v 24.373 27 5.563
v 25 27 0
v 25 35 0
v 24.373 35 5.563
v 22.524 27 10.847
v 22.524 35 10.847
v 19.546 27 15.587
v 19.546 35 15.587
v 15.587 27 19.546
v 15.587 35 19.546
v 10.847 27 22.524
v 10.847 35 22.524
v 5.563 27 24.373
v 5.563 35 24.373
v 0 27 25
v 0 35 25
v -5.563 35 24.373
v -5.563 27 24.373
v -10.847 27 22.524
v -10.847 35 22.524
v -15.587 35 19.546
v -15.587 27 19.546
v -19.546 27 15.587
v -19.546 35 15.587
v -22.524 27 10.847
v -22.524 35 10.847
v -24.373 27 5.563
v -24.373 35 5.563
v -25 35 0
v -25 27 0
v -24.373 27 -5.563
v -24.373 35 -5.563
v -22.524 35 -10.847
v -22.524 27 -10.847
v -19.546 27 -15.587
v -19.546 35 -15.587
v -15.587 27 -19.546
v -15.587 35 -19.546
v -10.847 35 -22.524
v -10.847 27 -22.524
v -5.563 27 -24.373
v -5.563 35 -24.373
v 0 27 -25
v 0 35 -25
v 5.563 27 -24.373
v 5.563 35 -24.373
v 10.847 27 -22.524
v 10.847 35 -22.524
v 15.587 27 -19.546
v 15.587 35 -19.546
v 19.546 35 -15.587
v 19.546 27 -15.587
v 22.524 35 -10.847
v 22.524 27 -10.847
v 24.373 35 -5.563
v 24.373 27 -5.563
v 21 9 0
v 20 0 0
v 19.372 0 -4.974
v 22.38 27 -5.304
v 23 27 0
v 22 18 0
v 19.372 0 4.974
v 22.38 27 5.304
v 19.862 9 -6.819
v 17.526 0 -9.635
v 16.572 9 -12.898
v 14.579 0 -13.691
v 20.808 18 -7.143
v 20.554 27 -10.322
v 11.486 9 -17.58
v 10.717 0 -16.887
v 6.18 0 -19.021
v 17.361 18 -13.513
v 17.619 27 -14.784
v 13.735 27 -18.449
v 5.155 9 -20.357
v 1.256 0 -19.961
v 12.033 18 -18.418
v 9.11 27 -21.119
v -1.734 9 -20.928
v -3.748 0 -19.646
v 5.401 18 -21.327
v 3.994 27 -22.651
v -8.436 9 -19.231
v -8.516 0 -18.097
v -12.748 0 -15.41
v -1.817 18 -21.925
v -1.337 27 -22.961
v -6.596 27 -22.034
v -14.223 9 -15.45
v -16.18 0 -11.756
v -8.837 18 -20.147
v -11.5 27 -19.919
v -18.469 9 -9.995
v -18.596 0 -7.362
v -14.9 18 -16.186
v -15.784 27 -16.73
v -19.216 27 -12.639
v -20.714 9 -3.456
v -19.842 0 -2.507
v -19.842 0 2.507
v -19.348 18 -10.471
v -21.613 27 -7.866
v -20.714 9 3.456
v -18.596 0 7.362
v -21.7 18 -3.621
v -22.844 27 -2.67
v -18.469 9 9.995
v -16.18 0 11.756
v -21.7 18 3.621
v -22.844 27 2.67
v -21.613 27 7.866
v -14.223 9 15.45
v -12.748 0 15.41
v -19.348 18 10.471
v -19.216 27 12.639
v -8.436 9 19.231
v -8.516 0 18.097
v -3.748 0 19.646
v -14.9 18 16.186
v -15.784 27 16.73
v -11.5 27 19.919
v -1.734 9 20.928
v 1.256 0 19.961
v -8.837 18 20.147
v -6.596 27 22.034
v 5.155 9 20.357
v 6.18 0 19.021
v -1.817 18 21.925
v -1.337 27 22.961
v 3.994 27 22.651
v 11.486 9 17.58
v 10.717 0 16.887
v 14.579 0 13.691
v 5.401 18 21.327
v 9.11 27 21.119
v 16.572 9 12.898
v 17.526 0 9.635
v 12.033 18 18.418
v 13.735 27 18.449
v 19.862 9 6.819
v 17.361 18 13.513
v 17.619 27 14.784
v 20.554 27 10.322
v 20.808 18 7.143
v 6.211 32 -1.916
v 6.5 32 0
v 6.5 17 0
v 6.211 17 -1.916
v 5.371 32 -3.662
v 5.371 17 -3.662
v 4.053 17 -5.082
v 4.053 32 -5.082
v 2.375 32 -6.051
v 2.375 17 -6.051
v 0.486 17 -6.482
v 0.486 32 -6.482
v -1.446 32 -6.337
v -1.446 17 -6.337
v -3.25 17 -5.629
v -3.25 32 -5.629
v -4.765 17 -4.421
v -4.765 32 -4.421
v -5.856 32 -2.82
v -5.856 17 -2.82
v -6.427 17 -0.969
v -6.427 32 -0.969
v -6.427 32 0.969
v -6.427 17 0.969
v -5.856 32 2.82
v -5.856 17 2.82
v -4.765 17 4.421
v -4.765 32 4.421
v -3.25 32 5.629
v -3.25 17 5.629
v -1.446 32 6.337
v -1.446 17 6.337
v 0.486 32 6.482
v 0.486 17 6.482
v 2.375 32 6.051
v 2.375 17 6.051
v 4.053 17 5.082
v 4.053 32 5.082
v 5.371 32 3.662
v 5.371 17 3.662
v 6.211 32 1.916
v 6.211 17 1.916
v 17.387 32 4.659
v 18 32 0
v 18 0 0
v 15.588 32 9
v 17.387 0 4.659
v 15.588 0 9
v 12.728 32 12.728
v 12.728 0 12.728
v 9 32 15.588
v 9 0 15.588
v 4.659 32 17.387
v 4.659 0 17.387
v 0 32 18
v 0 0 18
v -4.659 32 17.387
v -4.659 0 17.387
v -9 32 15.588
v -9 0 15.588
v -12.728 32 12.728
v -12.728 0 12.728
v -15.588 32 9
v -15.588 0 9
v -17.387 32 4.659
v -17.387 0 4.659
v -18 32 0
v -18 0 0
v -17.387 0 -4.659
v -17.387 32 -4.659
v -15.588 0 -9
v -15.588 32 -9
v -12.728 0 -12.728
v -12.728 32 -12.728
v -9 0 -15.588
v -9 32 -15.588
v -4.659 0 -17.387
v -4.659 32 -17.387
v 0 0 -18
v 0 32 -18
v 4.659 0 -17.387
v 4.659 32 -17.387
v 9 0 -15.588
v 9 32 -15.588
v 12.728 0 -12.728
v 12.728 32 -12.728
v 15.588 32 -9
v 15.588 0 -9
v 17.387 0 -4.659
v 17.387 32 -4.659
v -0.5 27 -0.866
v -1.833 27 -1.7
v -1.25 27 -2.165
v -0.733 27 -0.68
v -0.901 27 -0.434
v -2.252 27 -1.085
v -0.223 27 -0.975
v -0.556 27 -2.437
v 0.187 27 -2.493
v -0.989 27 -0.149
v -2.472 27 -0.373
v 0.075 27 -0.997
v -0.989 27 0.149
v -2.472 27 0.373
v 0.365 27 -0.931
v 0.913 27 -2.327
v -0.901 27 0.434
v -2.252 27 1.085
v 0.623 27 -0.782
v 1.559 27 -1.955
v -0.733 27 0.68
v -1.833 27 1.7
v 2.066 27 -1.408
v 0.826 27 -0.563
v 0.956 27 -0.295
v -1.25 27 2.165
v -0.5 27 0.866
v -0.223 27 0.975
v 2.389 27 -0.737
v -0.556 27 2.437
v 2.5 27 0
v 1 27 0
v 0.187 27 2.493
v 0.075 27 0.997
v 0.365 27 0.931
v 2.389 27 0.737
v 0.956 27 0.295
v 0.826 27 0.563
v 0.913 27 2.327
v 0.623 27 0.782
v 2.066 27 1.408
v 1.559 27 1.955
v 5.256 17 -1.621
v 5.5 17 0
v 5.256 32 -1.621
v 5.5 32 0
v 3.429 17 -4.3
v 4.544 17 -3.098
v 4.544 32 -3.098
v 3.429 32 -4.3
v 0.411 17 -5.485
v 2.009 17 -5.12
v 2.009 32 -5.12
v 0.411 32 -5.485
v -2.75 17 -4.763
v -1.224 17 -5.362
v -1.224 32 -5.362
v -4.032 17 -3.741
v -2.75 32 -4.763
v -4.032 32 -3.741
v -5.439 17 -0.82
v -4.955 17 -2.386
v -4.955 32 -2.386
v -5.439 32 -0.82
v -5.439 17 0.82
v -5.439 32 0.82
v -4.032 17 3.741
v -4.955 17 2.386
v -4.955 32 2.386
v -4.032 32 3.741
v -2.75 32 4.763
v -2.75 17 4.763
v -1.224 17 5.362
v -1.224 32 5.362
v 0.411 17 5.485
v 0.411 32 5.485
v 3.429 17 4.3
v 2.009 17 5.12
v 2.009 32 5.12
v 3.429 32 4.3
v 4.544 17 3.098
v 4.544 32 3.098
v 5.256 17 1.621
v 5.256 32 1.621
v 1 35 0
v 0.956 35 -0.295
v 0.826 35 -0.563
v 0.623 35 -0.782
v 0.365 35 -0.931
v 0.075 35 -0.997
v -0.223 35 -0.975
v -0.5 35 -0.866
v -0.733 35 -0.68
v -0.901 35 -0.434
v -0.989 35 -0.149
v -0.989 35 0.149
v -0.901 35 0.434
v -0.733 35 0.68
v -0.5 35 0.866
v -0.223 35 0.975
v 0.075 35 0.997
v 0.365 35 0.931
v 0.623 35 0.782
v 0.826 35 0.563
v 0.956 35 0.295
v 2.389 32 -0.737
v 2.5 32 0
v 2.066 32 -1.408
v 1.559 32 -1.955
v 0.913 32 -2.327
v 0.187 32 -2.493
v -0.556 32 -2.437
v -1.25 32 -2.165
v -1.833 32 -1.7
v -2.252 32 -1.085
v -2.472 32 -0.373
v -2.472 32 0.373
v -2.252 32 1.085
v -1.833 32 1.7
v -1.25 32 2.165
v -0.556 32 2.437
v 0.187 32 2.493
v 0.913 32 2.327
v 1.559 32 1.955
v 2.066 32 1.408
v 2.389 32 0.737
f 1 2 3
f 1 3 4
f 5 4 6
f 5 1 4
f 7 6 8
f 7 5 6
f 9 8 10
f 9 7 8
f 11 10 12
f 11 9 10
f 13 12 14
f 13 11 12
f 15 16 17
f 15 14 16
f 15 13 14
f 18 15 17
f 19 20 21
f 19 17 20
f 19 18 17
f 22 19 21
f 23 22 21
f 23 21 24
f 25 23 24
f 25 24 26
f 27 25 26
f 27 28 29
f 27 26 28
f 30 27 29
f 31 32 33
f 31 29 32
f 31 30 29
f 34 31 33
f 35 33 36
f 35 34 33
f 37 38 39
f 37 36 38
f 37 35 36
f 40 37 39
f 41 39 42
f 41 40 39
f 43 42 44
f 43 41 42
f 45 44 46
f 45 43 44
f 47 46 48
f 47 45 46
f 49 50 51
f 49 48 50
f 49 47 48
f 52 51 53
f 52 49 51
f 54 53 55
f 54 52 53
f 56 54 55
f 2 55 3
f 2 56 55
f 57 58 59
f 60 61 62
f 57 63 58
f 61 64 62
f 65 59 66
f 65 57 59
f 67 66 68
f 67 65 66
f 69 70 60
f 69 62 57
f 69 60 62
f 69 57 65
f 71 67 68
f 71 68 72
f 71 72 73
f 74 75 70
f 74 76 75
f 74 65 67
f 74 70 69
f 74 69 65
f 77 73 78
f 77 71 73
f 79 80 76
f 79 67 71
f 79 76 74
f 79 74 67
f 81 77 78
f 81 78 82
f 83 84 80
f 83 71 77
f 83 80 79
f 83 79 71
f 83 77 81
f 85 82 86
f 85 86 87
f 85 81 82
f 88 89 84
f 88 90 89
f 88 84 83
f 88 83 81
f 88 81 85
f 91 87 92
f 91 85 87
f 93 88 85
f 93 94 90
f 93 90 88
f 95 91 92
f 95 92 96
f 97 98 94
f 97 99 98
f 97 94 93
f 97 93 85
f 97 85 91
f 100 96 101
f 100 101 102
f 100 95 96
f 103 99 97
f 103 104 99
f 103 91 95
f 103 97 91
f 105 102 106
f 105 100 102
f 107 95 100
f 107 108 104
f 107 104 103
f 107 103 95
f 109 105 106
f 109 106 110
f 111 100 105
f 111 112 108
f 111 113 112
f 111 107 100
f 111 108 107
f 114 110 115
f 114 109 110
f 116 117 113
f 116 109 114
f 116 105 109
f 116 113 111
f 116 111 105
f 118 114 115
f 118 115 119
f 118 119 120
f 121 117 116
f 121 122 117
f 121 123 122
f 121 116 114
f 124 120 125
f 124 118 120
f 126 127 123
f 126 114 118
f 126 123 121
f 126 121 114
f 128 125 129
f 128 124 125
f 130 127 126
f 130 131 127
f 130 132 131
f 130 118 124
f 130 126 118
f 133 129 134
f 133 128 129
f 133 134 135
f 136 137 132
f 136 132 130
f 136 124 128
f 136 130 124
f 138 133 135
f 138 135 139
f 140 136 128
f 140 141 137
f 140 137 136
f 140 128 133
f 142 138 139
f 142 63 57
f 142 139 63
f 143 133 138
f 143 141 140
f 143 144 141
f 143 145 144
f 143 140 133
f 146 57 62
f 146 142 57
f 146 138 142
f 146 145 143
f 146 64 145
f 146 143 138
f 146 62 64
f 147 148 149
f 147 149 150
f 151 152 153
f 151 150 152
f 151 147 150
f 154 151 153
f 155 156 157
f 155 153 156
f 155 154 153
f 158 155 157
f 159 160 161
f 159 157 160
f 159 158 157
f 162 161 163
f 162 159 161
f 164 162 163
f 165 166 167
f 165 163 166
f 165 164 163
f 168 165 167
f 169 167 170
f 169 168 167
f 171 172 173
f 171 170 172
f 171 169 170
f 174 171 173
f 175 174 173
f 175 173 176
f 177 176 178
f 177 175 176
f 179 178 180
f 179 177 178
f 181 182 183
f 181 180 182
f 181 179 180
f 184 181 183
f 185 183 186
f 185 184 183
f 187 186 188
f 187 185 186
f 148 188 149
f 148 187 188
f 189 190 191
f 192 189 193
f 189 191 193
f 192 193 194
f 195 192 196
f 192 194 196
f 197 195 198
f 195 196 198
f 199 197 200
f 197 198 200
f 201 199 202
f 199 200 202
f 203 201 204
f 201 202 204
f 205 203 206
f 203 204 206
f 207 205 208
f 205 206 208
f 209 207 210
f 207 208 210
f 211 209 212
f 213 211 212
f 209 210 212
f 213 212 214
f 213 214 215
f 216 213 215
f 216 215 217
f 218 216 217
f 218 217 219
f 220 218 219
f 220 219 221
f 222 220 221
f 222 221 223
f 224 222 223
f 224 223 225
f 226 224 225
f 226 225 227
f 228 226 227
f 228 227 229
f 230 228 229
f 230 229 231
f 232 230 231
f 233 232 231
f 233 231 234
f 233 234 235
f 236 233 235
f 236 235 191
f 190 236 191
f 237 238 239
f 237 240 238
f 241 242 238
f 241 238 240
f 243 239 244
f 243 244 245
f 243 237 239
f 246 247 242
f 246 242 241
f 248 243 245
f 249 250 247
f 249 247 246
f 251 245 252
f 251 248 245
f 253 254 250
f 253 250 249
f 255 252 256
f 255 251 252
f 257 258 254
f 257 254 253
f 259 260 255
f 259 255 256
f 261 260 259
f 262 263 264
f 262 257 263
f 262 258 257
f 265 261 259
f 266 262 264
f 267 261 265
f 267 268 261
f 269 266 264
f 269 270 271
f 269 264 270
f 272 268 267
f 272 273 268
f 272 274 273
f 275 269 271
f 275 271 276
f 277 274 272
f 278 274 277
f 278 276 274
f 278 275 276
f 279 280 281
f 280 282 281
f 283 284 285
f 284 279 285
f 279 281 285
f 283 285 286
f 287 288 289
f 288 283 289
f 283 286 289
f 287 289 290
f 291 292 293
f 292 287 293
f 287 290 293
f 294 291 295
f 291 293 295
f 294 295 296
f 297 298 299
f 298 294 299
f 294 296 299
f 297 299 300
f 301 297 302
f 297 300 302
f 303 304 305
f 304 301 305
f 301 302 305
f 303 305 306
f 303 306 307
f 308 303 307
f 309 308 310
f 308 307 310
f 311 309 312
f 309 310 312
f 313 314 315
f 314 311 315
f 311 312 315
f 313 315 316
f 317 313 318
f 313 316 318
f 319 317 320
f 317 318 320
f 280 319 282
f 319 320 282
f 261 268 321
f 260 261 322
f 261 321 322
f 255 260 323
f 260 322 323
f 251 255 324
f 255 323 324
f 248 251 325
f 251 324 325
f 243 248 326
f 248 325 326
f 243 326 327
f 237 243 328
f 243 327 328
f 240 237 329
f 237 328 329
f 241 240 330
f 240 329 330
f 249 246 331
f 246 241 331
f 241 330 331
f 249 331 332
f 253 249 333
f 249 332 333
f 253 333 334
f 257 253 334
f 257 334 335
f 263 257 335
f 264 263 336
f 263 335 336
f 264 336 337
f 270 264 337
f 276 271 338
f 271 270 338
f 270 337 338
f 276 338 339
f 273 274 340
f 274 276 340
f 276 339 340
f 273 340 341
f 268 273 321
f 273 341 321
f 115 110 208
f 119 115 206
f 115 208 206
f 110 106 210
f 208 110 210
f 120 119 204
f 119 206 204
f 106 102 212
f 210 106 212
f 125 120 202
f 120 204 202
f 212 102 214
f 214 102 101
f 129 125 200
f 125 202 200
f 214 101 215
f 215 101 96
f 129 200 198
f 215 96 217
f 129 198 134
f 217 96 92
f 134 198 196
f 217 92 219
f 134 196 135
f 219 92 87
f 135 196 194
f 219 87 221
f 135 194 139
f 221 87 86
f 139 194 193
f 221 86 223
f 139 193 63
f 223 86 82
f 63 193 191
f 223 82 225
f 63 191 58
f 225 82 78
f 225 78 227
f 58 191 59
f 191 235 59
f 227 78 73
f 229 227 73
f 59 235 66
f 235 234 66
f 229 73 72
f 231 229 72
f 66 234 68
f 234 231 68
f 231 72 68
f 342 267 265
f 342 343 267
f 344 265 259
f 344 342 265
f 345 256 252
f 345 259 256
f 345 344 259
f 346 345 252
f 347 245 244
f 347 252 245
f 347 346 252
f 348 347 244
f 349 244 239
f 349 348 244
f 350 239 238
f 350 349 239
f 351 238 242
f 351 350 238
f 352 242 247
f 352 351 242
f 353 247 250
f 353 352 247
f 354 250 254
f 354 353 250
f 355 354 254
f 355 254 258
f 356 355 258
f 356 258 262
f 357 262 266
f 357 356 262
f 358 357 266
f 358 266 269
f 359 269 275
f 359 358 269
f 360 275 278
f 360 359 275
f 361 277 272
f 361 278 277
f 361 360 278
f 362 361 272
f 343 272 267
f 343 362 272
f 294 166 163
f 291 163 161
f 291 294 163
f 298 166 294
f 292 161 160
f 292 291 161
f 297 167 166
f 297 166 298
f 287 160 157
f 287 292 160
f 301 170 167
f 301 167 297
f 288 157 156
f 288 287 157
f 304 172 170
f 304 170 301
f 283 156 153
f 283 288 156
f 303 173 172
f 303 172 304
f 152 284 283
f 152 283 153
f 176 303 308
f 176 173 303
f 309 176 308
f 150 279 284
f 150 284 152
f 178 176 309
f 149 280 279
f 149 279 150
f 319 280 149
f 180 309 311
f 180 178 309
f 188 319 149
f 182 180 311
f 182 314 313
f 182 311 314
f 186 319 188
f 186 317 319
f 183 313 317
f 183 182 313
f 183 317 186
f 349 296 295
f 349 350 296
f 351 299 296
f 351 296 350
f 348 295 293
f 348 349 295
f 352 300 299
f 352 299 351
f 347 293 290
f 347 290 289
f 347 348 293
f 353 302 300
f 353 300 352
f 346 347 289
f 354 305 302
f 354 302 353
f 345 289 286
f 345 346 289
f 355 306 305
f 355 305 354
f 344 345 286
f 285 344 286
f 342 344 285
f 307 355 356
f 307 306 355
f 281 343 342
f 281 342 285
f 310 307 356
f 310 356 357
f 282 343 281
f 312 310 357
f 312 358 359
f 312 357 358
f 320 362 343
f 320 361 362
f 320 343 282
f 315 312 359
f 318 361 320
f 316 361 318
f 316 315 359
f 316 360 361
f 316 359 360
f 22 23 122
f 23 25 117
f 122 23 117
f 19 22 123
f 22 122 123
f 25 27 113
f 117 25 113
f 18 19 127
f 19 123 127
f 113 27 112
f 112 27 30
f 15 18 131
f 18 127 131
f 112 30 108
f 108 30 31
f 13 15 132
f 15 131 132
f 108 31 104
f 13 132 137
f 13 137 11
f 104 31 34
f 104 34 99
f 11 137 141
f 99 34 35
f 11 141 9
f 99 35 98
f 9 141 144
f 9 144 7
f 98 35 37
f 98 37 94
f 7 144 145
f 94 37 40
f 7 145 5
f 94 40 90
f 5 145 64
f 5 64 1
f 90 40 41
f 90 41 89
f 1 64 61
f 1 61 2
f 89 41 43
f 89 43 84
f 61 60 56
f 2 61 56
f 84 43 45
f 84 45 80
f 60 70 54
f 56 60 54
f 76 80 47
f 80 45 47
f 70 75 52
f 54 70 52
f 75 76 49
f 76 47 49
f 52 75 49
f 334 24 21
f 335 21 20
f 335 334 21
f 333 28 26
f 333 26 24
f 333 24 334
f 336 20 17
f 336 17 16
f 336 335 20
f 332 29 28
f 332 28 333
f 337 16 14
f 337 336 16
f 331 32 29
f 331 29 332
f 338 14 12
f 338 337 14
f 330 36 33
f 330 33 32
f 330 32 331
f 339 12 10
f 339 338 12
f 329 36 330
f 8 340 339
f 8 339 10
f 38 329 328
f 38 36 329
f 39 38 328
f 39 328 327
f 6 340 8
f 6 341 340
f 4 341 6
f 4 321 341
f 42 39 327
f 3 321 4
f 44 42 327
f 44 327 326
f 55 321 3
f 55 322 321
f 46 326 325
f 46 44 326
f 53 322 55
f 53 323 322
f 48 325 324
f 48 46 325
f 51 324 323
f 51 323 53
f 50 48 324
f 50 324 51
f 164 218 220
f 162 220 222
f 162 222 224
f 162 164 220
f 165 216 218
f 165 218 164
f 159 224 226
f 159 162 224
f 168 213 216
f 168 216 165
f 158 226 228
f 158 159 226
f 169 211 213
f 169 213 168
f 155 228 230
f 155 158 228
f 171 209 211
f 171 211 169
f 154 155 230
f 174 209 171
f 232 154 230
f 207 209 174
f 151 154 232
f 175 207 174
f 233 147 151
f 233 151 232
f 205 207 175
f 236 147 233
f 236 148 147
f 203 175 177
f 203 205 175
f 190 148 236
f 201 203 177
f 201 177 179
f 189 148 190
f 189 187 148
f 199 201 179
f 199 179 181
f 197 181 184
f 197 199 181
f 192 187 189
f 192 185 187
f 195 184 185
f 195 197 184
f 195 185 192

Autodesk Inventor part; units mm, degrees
ref_plane "YZ Plane" through (0, 0, 0) normal (1, 0, 0) x (0, 1, 0)
ref_plane "XZ Plane" through (0, 0, 0) normal (0, 1, 0) x (-1, 0, 0)
ref_plane "XY Plane" through (0, 0, 0) normal (0, 0, 1) x (1, 0, 0)
sketch "Sketch2" plane through (0, 0, 0) normal (0, 0, 1) x (1, 0, 0)
  line L0 (0, 0) -> (0, 35)
  line L1 (0, 35) -> (25, 35)
  line L2 (25, 35) -> (25, 27)
  line L3 (25, 27) -> (23, 27)
  line L4 (23, 27) -> (20, 0)
  line L5 (20, 0) -> (0, 0)
  dimension "d1" = 20
  dimension "d2" = 25
  dimension "d3" = 2
  dimension "d4" = 8
  dimension "d5" = 35
revolve "Revolution1" add sketch "Sketch2" angle 360 about axis through (0, 0, 0) along (0, 1, 0)
sketch "Sketch3" plane through (0, 35, 0) normal (0, 1, 0) x (1, 0, 0)
  circle A0 centre (0, 0) radius 25 projected
  circle A1 centre (0, 0) radius 1
  dimension "d7" = 2
extrude "Extrusion1" cut sketch "Sketch3" against normal through all contours A1
sketch "Sketch4" plane through (0, 0, 0) normal (0, -1, 0) x (1, 0, 0)
  circle A0 centre (0, 0) radius 1 projected
  circle A1 centre (0, 0) radius 20 projected
  circle A2 centre (0, 0) radius 18
  dimension "d10" = 2
  dimension "potOpeningDia" = 36
extrude "Extrusion2" cut sketch "Sketch4" against normal blind 32 contours A2
sketch "Sketch5" plane through (0, 32, 0) normal (0, -1, 0) x (1, 0, 0)
  circle A0 centre (0, 0) radius 1 projected
  circle A1 centre (0, 0) radius 18 projected
  circle A2 centre (0, 0) radius 2.5
  dimension "d13" = 5
extrude "Extrusion3" add sketch "Sketch5" along normal blind 5 contours A2
sketch "Sketch6" plane through (0, 32, 0) normal (0, -1, 0) x (1, 0, 0)
  circle A0 centre (0, 0) radius 18 projected
  circle A1 centre (0, 0) radius 5.5
  circle A2 centre (0, 0) radius 6.5
  dimension "d17" = 11
  dimension "d18" = 1
extrude "Extrusion4" add sketch "Sketch6" along normal blind 15 contours A2
properties part number "pot"
